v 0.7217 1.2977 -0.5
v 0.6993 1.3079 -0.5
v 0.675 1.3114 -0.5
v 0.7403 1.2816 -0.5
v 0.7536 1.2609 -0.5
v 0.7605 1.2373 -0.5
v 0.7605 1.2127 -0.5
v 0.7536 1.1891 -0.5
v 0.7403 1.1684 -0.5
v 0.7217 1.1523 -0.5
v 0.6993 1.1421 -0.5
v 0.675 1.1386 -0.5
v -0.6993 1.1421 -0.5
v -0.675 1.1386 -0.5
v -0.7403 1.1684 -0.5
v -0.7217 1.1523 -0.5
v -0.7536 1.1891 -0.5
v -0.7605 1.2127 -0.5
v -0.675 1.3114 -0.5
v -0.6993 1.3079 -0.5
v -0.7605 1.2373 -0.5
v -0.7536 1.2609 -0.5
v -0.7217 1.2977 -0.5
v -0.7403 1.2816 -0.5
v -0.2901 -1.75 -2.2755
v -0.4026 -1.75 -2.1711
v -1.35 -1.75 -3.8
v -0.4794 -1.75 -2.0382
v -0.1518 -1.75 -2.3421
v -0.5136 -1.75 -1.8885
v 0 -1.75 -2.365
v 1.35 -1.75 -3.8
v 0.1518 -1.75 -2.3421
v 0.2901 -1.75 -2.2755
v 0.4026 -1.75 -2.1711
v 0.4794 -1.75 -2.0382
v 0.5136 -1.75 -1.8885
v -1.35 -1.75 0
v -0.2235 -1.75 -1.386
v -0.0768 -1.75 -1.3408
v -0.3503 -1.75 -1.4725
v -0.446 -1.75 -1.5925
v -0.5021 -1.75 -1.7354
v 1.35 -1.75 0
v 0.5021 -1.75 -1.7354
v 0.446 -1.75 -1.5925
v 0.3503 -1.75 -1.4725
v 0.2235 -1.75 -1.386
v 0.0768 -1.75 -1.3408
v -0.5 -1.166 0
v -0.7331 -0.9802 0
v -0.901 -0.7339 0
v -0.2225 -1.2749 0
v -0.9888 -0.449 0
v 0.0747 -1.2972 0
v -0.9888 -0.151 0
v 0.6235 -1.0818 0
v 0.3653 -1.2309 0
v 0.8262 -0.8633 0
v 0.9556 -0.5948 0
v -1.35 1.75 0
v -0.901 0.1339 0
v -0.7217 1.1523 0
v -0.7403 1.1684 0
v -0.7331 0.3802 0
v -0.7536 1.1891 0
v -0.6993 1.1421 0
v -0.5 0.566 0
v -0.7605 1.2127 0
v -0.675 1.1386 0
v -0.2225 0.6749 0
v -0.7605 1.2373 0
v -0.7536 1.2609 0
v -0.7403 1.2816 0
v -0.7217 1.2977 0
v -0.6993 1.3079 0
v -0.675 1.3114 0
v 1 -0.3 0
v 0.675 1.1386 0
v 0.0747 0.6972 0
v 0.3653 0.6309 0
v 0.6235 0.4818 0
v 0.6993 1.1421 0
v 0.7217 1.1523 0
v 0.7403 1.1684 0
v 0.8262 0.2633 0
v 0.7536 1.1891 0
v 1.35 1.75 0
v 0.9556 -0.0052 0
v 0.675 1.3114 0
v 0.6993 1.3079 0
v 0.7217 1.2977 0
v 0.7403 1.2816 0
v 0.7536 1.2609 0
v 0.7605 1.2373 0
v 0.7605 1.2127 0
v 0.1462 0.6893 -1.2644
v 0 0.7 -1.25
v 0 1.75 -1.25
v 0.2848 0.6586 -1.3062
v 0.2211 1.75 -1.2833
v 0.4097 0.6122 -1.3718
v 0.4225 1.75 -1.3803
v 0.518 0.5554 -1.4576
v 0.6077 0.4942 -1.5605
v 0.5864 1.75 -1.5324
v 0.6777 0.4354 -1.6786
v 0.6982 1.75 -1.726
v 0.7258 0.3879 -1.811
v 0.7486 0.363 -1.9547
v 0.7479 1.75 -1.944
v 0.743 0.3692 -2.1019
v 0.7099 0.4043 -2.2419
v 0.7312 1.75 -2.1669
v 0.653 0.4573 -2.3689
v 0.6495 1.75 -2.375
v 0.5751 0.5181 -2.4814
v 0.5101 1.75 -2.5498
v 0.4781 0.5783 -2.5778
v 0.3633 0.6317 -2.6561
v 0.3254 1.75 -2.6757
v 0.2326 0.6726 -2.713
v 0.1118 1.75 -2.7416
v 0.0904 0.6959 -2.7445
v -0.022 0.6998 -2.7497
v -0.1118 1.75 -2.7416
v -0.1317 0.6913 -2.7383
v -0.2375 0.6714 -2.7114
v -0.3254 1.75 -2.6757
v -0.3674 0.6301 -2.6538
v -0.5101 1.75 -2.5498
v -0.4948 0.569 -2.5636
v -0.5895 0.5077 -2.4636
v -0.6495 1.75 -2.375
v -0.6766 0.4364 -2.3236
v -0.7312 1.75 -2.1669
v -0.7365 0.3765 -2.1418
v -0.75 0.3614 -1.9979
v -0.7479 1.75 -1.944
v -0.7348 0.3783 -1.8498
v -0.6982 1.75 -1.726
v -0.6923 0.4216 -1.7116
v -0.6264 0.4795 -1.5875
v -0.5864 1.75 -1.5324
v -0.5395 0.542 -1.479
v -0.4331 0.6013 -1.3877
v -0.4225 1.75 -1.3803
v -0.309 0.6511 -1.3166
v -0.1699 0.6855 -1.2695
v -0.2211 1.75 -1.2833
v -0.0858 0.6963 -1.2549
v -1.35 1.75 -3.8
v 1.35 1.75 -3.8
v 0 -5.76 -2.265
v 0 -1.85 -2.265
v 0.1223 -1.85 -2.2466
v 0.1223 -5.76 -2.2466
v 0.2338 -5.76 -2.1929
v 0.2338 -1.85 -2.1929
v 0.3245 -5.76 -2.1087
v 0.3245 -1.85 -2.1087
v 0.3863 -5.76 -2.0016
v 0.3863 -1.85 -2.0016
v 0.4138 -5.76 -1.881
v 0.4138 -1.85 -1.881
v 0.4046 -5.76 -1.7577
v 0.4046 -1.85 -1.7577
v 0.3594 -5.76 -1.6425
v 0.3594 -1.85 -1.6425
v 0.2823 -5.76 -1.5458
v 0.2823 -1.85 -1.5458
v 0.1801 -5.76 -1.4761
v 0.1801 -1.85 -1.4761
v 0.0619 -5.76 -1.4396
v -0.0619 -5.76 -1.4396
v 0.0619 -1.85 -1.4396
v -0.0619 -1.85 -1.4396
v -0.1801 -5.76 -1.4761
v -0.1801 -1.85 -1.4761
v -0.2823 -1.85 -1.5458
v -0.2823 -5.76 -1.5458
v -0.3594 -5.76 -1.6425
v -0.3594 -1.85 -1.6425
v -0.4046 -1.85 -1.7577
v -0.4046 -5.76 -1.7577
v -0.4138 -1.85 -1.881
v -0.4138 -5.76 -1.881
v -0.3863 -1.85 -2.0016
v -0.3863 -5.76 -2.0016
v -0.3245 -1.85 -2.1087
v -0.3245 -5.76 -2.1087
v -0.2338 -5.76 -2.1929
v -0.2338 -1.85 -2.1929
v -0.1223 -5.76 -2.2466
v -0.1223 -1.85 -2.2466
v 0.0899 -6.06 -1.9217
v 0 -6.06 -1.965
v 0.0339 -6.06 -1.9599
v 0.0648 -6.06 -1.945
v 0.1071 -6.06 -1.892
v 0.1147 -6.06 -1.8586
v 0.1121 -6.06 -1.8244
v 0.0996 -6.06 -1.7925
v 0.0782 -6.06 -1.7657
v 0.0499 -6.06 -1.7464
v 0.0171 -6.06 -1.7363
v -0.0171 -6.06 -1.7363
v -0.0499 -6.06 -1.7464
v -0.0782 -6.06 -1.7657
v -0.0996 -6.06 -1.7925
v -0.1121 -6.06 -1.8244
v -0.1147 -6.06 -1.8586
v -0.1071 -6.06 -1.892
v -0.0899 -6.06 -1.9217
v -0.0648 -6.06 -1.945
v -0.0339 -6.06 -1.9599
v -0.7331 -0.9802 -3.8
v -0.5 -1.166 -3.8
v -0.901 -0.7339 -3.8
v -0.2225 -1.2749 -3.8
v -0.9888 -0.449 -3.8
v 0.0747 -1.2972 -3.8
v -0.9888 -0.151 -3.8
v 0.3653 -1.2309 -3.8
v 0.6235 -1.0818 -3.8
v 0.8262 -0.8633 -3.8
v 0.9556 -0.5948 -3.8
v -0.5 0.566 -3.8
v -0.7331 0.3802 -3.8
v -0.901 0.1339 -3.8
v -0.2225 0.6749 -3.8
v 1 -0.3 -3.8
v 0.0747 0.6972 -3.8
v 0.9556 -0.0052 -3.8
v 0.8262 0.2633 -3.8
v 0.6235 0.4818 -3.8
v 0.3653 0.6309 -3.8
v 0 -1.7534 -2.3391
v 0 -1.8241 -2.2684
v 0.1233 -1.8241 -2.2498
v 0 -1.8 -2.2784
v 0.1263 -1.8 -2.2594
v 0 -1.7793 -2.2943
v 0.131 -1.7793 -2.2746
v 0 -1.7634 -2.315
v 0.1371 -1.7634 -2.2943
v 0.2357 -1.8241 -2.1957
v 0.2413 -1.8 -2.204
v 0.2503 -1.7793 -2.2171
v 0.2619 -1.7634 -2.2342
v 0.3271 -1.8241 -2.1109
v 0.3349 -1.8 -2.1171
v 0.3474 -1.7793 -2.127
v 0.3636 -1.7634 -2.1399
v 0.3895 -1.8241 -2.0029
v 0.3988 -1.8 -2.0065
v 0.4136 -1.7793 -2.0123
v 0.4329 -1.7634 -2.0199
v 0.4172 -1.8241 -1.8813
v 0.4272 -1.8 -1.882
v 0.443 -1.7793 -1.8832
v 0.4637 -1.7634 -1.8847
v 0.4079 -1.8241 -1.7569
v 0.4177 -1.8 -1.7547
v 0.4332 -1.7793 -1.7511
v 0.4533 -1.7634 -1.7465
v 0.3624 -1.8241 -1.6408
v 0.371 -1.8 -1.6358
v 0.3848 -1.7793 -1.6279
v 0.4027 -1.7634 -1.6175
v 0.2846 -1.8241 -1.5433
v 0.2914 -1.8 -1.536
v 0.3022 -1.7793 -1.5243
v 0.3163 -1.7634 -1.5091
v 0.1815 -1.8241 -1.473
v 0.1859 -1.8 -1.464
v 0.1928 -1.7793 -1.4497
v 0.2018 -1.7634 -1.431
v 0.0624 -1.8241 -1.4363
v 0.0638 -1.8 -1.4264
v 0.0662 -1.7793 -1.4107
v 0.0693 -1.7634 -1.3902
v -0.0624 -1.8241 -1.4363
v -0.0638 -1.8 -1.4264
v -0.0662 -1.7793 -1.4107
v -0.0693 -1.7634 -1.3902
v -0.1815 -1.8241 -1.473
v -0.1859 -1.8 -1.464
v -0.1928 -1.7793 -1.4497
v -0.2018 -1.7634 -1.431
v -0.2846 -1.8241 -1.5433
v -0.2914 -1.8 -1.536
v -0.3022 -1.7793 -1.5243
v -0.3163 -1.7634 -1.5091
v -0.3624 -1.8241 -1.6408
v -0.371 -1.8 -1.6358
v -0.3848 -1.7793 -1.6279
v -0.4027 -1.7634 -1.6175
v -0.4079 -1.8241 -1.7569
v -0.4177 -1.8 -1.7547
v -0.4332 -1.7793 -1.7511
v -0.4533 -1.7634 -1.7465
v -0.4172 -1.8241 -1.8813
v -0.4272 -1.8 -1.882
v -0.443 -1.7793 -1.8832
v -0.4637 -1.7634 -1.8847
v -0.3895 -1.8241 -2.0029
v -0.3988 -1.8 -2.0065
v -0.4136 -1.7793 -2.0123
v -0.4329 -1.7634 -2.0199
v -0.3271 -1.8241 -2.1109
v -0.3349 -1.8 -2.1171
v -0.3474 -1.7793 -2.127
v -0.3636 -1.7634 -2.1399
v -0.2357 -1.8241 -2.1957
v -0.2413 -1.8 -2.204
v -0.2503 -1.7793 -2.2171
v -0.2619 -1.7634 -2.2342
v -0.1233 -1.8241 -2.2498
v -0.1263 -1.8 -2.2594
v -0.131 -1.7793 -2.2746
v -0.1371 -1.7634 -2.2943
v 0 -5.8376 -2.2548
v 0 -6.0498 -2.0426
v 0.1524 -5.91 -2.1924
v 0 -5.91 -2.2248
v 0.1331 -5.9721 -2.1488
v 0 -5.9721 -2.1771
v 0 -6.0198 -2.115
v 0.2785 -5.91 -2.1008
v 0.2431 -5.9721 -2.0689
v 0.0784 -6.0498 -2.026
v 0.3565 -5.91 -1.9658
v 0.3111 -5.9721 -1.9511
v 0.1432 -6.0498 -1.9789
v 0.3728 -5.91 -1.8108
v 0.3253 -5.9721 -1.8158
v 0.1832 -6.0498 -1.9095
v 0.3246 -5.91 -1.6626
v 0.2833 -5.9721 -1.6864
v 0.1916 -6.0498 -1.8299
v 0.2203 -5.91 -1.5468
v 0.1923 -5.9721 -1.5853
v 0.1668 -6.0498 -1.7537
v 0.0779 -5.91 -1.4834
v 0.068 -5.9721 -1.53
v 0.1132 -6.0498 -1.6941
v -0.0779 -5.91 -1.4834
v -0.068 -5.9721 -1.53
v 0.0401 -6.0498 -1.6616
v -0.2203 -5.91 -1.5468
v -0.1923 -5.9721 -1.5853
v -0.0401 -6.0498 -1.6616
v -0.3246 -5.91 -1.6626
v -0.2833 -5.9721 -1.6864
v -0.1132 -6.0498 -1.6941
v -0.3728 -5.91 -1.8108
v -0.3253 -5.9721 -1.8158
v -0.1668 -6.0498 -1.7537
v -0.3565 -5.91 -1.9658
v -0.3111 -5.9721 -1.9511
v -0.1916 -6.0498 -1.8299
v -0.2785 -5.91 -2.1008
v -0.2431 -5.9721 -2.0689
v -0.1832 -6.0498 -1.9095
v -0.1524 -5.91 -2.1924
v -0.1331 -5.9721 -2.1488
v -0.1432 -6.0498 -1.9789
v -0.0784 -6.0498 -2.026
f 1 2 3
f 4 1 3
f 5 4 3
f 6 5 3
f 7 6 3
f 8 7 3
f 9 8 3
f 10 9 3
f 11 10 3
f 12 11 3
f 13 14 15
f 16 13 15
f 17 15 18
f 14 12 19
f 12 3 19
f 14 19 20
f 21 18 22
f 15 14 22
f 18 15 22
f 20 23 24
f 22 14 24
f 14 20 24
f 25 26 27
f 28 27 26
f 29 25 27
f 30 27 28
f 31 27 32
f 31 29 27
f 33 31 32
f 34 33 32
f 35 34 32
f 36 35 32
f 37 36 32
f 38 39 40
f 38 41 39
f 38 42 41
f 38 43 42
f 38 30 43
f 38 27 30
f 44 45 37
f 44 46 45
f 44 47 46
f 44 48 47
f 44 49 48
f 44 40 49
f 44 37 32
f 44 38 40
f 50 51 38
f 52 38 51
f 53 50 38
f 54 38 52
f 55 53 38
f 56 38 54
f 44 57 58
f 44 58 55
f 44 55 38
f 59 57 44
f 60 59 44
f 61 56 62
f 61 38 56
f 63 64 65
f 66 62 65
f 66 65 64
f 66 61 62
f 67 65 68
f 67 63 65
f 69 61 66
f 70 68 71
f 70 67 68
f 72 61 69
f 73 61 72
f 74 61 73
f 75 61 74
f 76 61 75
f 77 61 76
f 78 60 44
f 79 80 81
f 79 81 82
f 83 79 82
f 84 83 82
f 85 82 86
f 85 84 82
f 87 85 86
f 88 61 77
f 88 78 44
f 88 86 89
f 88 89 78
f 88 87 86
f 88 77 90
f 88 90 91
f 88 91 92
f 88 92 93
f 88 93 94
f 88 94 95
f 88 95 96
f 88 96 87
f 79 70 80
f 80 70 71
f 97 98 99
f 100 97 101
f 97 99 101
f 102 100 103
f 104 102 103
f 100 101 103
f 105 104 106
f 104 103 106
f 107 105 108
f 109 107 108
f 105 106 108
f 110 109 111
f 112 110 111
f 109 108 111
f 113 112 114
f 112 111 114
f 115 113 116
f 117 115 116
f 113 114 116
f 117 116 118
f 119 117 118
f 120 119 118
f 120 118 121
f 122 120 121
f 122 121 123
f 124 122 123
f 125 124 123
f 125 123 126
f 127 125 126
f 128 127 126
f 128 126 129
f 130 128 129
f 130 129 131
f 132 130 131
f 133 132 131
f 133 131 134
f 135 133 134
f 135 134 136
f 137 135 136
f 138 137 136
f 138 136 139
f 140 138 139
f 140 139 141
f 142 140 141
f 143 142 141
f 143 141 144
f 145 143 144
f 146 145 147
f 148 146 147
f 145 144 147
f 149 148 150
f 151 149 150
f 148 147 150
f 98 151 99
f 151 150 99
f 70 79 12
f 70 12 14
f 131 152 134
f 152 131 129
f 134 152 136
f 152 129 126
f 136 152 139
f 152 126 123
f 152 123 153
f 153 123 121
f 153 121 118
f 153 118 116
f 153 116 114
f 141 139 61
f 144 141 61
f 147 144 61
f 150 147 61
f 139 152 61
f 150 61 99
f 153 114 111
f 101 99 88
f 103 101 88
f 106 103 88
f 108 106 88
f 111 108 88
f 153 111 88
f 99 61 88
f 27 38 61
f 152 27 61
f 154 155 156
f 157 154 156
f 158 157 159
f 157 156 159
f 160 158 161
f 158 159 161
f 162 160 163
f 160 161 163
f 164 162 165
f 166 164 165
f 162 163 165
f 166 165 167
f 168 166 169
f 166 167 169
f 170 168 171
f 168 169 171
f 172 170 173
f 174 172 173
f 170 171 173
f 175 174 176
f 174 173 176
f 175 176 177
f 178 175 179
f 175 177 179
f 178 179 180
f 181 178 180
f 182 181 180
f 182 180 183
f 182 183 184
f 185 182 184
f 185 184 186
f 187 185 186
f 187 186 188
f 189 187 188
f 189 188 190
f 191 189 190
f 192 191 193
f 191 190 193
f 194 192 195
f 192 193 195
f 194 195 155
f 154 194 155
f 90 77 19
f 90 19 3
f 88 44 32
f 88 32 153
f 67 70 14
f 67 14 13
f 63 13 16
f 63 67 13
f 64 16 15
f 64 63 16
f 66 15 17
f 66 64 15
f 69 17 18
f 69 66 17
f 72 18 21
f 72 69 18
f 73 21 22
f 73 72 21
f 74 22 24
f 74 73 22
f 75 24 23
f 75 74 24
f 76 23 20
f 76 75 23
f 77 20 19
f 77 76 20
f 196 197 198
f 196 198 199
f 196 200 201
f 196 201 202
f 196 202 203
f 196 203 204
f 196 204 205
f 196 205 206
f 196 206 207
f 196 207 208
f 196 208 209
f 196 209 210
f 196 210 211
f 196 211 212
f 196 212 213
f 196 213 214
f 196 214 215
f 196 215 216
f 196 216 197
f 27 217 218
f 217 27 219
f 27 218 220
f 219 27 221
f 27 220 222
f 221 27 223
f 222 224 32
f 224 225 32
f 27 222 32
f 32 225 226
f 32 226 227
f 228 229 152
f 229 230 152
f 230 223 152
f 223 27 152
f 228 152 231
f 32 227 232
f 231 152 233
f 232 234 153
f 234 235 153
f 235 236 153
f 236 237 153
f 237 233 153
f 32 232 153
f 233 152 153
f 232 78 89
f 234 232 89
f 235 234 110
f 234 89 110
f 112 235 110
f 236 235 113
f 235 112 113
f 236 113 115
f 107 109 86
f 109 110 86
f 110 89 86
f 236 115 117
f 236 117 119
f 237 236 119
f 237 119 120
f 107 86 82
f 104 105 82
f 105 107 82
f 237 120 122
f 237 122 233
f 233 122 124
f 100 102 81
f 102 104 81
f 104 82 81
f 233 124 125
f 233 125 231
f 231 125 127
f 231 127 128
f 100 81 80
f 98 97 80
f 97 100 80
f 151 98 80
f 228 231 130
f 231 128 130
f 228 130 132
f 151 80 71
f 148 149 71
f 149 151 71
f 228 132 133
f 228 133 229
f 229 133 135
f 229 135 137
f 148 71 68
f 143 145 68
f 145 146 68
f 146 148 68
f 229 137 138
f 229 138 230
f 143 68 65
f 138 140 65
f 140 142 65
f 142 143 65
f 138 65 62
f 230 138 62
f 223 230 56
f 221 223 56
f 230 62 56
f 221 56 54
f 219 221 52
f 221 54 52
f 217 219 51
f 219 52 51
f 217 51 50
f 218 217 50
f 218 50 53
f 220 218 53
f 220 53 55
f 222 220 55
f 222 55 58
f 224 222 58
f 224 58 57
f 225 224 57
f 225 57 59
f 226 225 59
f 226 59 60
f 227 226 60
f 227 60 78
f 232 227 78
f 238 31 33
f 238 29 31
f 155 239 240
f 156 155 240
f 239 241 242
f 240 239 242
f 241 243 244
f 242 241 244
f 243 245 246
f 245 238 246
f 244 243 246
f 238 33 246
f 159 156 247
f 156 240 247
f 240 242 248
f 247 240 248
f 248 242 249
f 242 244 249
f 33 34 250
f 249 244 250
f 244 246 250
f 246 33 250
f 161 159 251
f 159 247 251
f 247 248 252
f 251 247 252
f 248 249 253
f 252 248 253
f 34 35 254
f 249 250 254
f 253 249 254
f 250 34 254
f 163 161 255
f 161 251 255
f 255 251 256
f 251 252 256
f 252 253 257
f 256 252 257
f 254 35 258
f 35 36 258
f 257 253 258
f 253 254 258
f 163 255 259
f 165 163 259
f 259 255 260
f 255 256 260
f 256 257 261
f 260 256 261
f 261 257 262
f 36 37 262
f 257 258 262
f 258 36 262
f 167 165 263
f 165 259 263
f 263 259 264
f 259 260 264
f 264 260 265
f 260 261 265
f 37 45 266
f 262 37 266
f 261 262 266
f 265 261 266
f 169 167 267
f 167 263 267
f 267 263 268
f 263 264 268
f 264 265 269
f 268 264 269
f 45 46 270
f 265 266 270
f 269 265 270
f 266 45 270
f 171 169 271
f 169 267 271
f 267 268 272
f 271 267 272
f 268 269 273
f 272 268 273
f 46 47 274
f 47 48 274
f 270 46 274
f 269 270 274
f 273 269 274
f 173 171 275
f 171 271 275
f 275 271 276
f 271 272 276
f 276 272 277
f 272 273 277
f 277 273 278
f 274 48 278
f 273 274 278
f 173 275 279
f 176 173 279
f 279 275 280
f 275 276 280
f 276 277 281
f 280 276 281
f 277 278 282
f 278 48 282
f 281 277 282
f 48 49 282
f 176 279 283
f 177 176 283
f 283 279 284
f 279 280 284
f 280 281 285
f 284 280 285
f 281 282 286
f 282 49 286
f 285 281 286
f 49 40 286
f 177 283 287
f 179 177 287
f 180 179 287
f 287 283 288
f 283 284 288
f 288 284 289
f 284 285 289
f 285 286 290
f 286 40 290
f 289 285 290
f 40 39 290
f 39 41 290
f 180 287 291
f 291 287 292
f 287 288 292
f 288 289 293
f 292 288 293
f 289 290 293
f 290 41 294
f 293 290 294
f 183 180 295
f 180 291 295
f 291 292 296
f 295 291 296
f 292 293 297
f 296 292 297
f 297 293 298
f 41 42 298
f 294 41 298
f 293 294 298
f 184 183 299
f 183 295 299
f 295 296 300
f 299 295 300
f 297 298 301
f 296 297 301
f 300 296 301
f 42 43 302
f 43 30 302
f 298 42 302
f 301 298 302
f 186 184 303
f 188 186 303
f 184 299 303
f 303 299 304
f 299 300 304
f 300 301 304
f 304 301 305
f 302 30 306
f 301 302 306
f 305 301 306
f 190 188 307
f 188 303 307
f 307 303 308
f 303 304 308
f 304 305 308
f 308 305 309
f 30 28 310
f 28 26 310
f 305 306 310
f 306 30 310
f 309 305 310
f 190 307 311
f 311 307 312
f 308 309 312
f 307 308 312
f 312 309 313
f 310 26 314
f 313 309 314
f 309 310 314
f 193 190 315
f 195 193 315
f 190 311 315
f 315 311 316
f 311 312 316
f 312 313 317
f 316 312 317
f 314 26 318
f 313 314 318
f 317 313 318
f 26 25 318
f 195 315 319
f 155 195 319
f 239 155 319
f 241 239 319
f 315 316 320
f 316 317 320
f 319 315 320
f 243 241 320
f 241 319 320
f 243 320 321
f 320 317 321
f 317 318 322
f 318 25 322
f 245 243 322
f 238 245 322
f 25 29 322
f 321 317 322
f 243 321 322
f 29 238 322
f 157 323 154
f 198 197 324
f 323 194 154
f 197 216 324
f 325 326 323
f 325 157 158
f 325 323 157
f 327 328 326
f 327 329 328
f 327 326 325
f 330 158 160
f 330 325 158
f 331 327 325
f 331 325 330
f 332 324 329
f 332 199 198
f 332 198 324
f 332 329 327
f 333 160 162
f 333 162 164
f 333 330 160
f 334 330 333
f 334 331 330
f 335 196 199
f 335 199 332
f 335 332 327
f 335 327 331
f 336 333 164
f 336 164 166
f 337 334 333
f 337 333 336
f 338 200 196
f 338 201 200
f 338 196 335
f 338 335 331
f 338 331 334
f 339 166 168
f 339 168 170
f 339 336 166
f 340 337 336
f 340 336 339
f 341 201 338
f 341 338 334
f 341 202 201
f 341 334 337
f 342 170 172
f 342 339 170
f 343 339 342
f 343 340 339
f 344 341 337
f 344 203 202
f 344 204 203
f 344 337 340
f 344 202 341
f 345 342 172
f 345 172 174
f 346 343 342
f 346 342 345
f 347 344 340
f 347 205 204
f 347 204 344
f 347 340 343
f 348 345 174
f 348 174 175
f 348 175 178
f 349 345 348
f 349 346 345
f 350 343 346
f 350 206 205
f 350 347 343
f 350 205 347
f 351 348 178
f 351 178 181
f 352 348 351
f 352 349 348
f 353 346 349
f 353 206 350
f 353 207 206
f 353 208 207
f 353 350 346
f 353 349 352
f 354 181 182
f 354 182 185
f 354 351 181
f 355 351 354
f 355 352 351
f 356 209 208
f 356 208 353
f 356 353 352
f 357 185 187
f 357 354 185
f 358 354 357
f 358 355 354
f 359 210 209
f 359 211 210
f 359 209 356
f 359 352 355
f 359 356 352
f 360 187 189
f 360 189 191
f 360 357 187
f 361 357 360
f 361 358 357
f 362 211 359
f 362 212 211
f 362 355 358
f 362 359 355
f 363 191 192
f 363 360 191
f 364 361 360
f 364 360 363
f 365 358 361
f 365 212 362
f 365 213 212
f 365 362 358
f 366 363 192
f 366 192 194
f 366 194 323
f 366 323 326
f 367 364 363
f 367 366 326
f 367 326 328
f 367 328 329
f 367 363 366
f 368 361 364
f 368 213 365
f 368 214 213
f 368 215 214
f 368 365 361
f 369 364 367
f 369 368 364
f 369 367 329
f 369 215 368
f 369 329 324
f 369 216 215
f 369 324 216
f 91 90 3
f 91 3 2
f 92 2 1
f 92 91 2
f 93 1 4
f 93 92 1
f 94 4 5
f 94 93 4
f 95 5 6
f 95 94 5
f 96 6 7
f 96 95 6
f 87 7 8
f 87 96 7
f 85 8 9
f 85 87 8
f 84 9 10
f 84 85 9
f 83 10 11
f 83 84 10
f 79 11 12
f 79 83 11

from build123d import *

# Parameters (mm, degrees)
SKETCH_1_W           = 2.7
SKETCH_1_H           = 3.5
EXTRUDE_1_DEPTH      = 3.8
SKETCH_2_OUTSIDE_W   = 5.866
SKETCH_2_OUTSIDE_H   = 6.666
SKETCH_2_OUTSIDE_W_2 = 2.7
SKETCH_2_OUTSIDE_H_2 = 3.5
SKETCH_2_OUTSIDE_R   = 1
CUT_EXTRUDE_1_DEPTH  = 5.396020928
SKETCH_4_OUTSIDE_W   = 5.866
SKETCH_4_OUTSIDE_H   = 6.966
SKETCH_4_OUTSIDE_W_2 = 2.7
SKETCH_4_OUTSIDE_H_2 = 3.8
SKETCH_4_OUTSIDE_R   = 0.75
CUT_EXTRUDE_2_DEPTH  = 1.85
CUT_EXTRUDE_3_DEPTH  = 0.5
SKETCH_6_R           = 0.415
EXTRUDE_2_DEPTH      = 4.31
FILLET_1_R           = 0.3
FILLET_2_R           = 0.1


with BuildPart() as part:
    # Эскиз1 → Бобышка-Вытянуть1 (new body)
    with BuildSketch(Plane.XY):
        Rectangle(SKETCH_1_W, SKETCH_1_H)
    extrude(amount=-EXTRUDE_1_DEPTH)

    # Эскиз2 outside → Вырез-Вытянуть1 (cut, through all)
    # profile 1 of 2: a face of its own
    with BuildSketch(Plane.XY):
        Rectangle(SKETCH_2_OUTSIDE_W, SKETCH_2_OUTSIDE_H)
        Rectangle(SKETCH_2_OUTSIDE_W_2, SKETCH_2_OUTSIDE_H_2, mode=Mode.SUBTRACT)
    # profile 2 of 2: a face of its own
    with BuildSketch(Plane.XY):
        with Locations((0, -0.3)):
            Circle(SKETCH_2_OUTSIDE_R)
    extrude(amount=-CUT_EXTRUDE_1_DEPTH, mode=Mode.SUBTRACT)

    # Эскиз4 outside → Вырез-Вытянуть2 (cut)
    # profile 1 of 2: a face of its own
    with BuildSketch(Plane(origin=(0, 1.75, 0), x_dir=(1, 0, 0), z_dir=(0, 1, 0))):
        with Locations((0, 1.9)):
            Rectangle(SKETCH_4_OUTSIDE_W, SKETCH_4_OUTSIDE_H)
        with Locations((0, 1.9)):
            Rectangle(SKETCH_4_OUTSIDE_W_2, SKETCH_4_OUTSIDE_H_2, mode=Mode.SUBTRACT)
    # profile 2 of 2: a face of its own
    with BuildSketch(Plane(origin=(0, 1.75, 0), x_dir=(1, 0, 0), z_dir=(0, 1, 0))):
        with Locations(Location((0, 2, 0), (0, 0, 270))):
            Circle(SKETCH_4_OUTSIDE_R)
    extrude(amount=-CUT_EXTRUDE_2_DEPTH, mode=Mode.SUBTRACT)

    # Эскиз5 → Вырез-Вытянуть3 (cut)
    with BuildSketch(Plane.XY):
        with BuildLine():
            Line((-0.675, 1.311413609), (0.675, 1.311413609))
            ThreePointArc((0.675, 1.311413609), (0.761413609, 1.225), (0.675, 1.138586391))
            Line((0.675, 1.138586391), (-0.675, 1.138586391))
            ThreePointArc((-0.675, 1.138586391), (-0.761413609, 1.225), (-0.675, 1.311413609))
        make_face()
    extrude(amount=-CUT_EXTRUDE_3_DEPTH, mode=Mode.SUBTRACT)

    # Эскиз6 → Бобышка-Вытянуть2 (add)
    with BuildSketch(Plane.XZ.offset(1.75)):
        with Locations(Location((0, -1.85, 0), (0, 0, 270))):
            Circle(SKETCH_6_R)
    extrude(amount=EXTRUDE_2_DEPTH)

    # Скругление1
    fillet_1_edges = [part.edges().sort_by_distance(p)[0] for p in [
        (0, -6.06, -1.435),
    ]]
    fillet(fillet_1_edges, radius=FILLET_1_R)

    # Скругление2
    fillet_2_edges = [part.edges().sort_by_distance(p)[0] for p in [
        (0, -1.75, -1.435),
    ]]
    fillet(fillet_2_edges, radius=FILLET_2_R)


solid = part.part
